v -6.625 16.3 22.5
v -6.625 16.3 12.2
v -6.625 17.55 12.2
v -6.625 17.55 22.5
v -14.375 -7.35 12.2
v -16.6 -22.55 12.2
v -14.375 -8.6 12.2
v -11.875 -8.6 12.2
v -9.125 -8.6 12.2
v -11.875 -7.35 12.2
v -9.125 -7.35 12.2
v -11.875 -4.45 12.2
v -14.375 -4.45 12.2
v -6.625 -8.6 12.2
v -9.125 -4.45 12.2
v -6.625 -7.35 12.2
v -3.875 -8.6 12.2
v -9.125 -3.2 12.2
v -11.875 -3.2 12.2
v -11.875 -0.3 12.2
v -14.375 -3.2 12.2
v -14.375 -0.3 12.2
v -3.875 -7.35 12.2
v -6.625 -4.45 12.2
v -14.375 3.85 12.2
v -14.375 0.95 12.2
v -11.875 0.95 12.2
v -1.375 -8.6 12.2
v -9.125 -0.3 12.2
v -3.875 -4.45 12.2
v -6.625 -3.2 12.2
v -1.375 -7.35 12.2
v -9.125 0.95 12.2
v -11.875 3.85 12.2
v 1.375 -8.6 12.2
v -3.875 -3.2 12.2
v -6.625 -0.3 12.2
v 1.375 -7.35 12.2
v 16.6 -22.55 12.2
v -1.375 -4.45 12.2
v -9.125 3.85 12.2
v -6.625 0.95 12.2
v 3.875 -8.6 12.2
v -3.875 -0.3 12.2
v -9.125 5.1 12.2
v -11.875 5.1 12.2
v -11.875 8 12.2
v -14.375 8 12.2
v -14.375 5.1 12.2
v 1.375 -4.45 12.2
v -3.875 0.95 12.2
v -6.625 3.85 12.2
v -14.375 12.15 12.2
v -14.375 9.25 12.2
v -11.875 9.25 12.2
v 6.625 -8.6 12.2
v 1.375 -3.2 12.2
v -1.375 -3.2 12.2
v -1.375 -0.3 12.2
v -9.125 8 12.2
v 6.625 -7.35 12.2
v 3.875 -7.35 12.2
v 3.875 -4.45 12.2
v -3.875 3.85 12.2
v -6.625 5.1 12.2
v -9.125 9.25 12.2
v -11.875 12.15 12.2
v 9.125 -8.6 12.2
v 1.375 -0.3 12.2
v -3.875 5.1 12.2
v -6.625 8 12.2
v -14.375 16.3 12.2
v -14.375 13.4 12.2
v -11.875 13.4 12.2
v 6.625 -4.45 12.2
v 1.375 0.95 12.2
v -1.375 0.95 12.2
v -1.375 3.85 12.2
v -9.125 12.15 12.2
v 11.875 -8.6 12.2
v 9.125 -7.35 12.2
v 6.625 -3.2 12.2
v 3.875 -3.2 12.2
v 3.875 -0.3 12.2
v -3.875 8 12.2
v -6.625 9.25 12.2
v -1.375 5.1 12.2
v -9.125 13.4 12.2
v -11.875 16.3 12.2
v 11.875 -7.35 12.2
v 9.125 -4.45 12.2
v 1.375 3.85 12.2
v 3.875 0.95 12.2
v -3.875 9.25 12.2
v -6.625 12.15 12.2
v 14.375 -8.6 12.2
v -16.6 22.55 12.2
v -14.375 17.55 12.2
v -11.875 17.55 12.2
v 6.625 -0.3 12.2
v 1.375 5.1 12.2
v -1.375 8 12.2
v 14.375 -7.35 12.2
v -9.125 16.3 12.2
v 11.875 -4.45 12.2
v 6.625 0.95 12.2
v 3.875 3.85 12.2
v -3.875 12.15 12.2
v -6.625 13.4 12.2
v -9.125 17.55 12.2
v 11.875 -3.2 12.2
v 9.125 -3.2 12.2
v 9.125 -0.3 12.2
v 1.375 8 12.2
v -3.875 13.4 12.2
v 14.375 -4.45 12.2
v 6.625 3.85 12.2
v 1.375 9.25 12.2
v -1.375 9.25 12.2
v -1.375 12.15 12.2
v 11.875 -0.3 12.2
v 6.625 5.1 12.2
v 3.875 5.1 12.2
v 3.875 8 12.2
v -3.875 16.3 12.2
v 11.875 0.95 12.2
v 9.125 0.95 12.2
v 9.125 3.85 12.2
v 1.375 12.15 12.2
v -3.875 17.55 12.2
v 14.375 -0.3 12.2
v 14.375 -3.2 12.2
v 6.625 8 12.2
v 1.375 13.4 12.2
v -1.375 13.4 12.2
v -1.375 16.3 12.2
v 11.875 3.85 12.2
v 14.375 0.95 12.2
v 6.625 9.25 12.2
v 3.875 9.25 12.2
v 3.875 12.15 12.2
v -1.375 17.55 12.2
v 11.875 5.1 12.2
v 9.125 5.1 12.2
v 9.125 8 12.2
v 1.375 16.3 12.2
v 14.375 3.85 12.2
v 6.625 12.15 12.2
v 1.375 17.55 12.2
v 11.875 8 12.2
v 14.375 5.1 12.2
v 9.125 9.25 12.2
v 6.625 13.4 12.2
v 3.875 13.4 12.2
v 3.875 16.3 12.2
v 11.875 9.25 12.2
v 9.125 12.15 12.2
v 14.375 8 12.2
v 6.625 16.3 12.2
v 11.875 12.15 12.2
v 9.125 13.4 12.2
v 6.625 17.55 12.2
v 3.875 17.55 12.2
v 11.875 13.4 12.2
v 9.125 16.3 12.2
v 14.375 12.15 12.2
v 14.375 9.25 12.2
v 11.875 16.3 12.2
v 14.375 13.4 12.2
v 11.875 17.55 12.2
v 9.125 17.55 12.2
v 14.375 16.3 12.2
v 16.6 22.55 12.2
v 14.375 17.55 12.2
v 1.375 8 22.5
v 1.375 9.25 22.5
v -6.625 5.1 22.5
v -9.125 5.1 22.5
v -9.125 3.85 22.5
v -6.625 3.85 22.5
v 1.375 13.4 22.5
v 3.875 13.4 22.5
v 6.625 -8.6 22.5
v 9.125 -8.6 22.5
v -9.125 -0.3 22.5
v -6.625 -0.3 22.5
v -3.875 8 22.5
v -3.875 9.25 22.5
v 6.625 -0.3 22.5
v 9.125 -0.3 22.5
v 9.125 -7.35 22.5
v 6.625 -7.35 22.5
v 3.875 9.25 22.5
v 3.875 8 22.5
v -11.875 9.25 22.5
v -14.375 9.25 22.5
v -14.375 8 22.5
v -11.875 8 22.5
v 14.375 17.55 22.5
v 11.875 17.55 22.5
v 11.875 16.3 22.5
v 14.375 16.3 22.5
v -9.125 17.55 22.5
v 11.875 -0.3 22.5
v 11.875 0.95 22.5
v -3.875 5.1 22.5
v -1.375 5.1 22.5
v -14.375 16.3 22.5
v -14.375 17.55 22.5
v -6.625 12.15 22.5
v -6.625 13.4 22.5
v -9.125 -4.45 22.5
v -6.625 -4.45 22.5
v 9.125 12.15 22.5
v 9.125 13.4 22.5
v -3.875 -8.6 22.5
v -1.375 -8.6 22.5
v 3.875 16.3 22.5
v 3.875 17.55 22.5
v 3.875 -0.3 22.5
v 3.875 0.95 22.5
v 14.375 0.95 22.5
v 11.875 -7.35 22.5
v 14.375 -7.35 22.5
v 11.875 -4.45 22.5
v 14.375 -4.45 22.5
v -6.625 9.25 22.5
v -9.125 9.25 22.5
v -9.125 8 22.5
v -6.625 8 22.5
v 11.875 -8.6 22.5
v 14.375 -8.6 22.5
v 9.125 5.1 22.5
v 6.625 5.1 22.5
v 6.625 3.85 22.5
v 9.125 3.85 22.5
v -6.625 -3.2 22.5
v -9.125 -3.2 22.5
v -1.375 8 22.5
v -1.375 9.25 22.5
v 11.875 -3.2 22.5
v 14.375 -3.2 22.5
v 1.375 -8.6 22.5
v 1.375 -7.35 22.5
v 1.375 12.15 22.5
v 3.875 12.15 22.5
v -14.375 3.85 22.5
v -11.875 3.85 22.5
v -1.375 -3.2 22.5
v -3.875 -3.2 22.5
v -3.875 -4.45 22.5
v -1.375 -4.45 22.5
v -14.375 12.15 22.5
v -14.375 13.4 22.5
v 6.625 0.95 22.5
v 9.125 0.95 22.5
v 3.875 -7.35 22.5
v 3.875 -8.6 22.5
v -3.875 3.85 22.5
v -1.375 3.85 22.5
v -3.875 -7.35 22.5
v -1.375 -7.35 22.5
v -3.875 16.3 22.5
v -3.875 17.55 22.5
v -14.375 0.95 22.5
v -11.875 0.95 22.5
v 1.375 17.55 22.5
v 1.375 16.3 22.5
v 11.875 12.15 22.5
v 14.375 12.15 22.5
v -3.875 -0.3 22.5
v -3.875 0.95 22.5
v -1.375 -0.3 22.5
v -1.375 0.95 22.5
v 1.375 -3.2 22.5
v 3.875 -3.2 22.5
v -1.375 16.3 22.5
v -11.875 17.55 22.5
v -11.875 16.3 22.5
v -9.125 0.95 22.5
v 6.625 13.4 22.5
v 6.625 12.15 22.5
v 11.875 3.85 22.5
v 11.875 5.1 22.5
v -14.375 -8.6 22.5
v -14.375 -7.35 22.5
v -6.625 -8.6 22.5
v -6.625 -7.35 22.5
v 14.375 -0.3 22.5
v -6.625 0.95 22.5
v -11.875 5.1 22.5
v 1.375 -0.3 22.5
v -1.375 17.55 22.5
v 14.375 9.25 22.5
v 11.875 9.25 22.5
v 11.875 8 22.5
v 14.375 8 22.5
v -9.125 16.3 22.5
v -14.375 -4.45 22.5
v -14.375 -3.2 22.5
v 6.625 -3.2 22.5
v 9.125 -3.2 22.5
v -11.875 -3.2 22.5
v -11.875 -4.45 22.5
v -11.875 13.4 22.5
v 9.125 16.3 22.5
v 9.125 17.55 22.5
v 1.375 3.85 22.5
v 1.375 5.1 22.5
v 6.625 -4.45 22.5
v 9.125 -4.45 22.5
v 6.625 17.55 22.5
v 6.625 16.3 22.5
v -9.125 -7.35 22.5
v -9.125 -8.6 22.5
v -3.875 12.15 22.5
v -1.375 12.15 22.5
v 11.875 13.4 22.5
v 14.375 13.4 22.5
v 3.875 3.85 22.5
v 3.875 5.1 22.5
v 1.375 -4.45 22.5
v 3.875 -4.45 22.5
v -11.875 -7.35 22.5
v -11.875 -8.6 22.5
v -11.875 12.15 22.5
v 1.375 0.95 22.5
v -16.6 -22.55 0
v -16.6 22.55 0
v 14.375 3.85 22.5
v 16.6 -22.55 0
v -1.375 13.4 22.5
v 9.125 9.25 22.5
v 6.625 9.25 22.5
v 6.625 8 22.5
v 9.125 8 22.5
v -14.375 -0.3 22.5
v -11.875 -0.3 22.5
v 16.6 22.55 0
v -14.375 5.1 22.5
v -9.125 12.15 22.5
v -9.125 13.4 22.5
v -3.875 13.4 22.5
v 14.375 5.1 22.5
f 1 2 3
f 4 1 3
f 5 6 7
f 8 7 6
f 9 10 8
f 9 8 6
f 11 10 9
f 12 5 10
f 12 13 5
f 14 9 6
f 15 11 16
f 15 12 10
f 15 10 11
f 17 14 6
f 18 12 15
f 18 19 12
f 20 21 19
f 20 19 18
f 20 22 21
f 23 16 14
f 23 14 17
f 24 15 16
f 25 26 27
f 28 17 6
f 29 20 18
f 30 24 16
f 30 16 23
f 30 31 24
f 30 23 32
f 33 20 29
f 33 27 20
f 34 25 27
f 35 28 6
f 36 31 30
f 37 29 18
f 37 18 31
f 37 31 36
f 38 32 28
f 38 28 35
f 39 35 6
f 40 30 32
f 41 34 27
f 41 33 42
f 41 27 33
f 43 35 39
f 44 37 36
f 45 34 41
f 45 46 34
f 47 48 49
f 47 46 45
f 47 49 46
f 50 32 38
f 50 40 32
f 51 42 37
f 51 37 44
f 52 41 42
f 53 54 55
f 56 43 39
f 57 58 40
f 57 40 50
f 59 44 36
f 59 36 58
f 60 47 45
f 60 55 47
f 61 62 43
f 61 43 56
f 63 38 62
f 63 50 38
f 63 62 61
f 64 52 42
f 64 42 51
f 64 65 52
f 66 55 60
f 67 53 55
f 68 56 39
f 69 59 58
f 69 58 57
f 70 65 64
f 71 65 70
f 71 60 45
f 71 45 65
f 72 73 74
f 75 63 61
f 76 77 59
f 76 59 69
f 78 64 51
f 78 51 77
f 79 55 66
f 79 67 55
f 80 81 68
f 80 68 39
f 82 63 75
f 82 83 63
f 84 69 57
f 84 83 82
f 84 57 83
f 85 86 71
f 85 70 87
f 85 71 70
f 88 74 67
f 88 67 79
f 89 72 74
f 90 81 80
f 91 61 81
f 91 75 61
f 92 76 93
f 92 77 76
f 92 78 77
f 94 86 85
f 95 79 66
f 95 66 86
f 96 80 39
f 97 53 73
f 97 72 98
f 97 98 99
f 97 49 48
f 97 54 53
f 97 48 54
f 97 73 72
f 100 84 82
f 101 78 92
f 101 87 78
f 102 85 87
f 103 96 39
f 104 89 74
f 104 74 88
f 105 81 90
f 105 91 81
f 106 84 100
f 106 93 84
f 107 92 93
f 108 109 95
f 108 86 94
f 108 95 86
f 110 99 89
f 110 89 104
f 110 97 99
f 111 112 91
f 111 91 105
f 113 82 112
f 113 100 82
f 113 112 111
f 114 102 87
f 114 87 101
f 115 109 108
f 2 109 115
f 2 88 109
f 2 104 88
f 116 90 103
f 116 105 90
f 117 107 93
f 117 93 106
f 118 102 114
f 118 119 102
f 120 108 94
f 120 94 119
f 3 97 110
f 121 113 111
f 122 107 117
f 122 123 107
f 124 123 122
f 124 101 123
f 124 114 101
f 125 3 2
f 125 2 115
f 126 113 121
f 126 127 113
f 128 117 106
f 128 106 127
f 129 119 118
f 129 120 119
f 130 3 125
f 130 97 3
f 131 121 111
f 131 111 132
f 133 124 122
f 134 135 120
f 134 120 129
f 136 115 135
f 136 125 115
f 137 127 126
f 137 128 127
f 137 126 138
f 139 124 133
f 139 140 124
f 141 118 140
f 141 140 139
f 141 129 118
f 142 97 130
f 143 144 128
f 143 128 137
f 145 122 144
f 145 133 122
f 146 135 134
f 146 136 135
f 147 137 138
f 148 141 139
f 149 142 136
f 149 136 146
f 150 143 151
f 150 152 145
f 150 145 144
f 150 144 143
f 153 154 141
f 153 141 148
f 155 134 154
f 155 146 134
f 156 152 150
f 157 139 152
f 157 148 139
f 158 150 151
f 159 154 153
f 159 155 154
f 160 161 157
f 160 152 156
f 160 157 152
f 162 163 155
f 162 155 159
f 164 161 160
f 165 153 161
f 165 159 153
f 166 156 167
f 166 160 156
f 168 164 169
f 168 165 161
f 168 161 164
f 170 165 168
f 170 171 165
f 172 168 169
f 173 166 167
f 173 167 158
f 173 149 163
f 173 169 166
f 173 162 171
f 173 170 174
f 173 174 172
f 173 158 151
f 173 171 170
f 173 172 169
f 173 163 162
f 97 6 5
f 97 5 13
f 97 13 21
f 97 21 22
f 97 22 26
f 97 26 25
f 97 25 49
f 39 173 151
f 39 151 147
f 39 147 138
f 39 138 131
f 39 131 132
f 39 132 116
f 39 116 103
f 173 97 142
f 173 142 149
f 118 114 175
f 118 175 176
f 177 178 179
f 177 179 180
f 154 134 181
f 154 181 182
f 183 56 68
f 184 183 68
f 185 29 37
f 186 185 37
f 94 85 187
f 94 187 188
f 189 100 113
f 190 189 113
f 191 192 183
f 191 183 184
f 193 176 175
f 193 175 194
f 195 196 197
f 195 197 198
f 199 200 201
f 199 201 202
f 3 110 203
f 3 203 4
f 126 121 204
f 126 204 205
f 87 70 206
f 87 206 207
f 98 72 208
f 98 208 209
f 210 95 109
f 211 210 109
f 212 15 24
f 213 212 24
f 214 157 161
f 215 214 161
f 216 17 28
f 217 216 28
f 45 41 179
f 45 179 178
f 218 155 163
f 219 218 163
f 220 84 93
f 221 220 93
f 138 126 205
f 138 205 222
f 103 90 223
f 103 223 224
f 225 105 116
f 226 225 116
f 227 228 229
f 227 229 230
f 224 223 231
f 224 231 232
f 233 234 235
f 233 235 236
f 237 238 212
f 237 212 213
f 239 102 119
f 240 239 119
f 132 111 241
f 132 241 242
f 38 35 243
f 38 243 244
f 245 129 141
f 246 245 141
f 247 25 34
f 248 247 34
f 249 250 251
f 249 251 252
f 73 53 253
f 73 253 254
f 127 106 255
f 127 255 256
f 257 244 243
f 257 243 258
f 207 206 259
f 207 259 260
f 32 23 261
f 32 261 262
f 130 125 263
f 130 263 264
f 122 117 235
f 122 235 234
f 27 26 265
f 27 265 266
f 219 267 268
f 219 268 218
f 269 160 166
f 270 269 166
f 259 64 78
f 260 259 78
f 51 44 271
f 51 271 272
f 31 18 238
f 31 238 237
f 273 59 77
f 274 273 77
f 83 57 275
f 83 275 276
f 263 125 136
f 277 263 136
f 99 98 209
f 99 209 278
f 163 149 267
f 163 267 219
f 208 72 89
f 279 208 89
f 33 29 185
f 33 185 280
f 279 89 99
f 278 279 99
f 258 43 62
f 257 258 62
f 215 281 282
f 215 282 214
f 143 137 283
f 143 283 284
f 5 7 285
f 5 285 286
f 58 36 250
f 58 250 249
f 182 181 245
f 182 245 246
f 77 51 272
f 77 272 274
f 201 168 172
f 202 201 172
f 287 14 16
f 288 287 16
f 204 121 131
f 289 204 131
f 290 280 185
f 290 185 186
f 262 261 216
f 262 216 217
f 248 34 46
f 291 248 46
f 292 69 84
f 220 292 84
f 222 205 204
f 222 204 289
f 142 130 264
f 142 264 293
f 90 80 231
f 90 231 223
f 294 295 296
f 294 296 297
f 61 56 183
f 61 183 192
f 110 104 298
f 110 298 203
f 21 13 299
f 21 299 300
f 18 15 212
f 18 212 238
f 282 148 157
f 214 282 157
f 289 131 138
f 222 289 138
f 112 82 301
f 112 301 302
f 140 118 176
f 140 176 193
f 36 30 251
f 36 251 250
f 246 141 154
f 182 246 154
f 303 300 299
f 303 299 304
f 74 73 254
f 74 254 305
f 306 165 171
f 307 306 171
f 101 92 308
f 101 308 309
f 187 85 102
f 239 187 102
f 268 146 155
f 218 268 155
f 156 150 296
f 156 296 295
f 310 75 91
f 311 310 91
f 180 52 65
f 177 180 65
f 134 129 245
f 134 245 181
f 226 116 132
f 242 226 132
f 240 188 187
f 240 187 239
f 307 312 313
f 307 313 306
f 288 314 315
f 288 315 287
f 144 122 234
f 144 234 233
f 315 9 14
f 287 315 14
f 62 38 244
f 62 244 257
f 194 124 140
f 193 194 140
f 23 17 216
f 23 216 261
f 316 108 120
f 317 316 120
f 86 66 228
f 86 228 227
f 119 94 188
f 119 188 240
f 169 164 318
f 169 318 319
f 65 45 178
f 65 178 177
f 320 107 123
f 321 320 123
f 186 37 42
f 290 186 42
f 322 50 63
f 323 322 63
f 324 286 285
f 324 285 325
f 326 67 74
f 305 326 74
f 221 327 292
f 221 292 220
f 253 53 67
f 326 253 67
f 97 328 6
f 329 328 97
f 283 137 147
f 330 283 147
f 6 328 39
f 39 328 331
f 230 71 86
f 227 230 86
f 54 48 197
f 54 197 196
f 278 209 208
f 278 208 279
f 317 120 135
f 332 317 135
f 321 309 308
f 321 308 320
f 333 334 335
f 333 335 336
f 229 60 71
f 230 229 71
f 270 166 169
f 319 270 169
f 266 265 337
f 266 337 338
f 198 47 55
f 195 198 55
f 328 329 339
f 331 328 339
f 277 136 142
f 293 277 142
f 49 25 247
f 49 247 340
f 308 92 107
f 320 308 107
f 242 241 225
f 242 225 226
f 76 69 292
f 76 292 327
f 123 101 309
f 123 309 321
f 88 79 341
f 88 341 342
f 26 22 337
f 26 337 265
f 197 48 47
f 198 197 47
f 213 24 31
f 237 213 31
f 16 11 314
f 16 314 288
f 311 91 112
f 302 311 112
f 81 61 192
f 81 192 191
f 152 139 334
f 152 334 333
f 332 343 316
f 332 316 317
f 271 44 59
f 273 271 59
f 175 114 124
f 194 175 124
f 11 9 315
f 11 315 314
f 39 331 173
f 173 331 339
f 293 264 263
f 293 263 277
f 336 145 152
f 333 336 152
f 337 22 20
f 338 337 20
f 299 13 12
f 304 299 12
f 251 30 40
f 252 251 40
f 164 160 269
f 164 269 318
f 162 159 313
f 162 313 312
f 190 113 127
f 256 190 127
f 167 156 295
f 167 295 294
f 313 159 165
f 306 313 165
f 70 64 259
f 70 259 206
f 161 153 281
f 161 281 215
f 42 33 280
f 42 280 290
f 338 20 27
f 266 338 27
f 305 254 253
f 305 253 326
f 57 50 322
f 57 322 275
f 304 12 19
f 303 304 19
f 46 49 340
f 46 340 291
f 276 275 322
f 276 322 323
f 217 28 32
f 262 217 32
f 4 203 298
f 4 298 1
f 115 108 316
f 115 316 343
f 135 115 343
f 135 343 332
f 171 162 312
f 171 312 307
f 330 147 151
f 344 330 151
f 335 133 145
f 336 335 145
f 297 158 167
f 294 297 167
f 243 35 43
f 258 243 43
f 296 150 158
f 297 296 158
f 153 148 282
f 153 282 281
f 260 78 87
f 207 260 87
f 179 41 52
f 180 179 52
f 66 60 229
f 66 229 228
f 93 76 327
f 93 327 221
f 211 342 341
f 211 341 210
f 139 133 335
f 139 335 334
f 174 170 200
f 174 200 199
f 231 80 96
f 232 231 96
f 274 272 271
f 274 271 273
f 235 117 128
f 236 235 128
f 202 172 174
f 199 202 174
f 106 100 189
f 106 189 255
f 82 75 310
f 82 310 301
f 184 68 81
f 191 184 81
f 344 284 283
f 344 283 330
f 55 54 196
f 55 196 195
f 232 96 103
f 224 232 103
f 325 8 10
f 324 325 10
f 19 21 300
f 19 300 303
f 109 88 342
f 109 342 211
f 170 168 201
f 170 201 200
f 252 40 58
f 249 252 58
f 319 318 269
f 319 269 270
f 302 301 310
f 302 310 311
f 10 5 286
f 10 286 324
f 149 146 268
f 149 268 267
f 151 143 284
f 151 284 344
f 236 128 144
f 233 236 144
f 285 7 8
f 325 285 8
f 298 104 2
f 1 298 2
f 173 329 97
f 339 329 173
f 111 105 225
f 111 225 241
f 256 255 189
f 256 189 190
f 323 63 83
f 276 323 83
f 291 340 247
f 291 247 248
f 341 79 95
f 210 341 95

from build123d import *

# Parameters (mm, degrees)
F0_W     = 33.2
F0_H     = 45.1
F1_DEPTH = 12.2
F2_W     = 2.5
F2_H     = 1.25
F3_DEPTH = 10.3


with BuildPart() as f1:
    # F0 (on Top) → F1 (new body)
    with BuildSketch(Plane.XY):
        Rectangle(F0_W, F0_H)
    extrude(amount=F1_DEPTH)

    # F2 (on face) → F3 (join)
    with BuildSketch(Plane.XY.offset(12.2)):
        with Locations((-13.125, 16.925)):
            Rectangle(F2_W, F2_H)
        with Locations((-13.125, 12.775)):
            Rectangle(F2_W, F2_H)
        with Locations((-13.125, 8.625)):
            Rectangle(F2_W, F2_H)
        with Locations((-13.125, 4.475)):
            Rectangle(F2_W, F2_H)
        with Locations((-13.125, 0.325)):
            Rectangle(F2_W, F2_H)
        with Locations((-13.125, -3.825)):
            Rectangle(F2_W, F2_H)
        with Locations((-13.125, -7.975)):
            Rectangle(F2_W, F2_H)
        with Locations((-7.875, 16.925)):
            Rectangle(F2_W, F2_H)
        with Locations((-7.875, 12.775)):
            Rectangle(F2_W, F2_H)
        with Locations((-7.875, 8.625)):
            Rectangle(F2_W, F2_H)
        with Locations((-7.875, 4.475)):
            Rectangle(F2_W, F2_H)
        with Locations((-7.875, 0.325)):
            Rectangle(F2_W, F2_H)
        with Locations((-7.875, -3.825)):
            Rectangle(F2_W, F2_H)
        with Locations((-7.875, -7.975)):
            Rectangle(F2_W, F2_H)
        with Locations((-2.625, 16.925)):
            Rectangle(F2_W, F2_H)
        with Locations((-2.625, 12.775)):
            Rectangle(F2_W, F2_H)
        with Locations((-2.625, 8.625)):
            Rectangle(F2_W, F2_H)
        with Locations((-2.625, 4.475)):
            Rectangle(F2_W, F2_H)
        with Locations((-2.625, 0.325)):
            Rectangle(F2_W, F2_H)
        with Locations((-2.625, -3.825)):
            Rectangle(F2_W, F2_H)
        with Locations((-2.625, -7.975)):
            Rectangle(F2_W, F2_H)
        with Locations((2.625, 16.925)):
            Rectangle(F2_W, F2_H)
        with Locations((2.625, 12.775)):
            Rectangle(F2_W, F2_H)
        with Locations((2.625, 8.625)):
            Rectangle(F2_W, F2_H)
        with Locations((2.625, 4.475)):
            Rectangle(F2_W, F2_H)
        with Locations((2.625, 0.325)):
            Rectangle(F2_W, F2_H)
        with Locations((2.625, -3.825)):
            Rectangle(F2_W, F2_H)
        with Locations((2.625, -7.975)):
            Rectangle(F2_W, F2_H)
        with Locations((7.875, 16.925)):
            Rectangle(F2_W, F2_H)
        with Locations((7.875, 12.775)):
            Rectangle(F2_W, F2_H)
        with Locations((7.875, 8.625)):
            Rectangle(F2_W, F2_H)
        with Locations((7.875, 4.475)):
            Rectangle(F2_W, F2_H)
        with Locations((7.875, 0.325)):
            Rectangle(F2_W, F2_H)
        with Locations((7.875, -3.825)):
            Rectangle(F2_W, F2_H)
        with Locations((7.875, -7.975)):
            Rectangle(F2_W, F2_H)
        with Locations((13.125, 16.925)):
            Rectangle(F2_W, F2_H)
        with Locations((13.125, 12.775)):
            Rectangle(F2_W, F2_H)
        with Locations((13.125, 8.625)):
            Rectangle(F2_W, F2_H)
        with Locations((13.125, 4.475)):
            Rectangle(F2_W, F2_H)
        with Locations((13.125, 0.325)):
            Rectangle(F2_W, F2_H)
        with Locations((13.125, -3.825)):
            Rectangle(F2_W, F2_H)
        with Locations((13.125, -7.975)):
            Rectangle(F2_W, F2_H)
    extrude(amount=F3_DEPTH)


solid = f1.part
